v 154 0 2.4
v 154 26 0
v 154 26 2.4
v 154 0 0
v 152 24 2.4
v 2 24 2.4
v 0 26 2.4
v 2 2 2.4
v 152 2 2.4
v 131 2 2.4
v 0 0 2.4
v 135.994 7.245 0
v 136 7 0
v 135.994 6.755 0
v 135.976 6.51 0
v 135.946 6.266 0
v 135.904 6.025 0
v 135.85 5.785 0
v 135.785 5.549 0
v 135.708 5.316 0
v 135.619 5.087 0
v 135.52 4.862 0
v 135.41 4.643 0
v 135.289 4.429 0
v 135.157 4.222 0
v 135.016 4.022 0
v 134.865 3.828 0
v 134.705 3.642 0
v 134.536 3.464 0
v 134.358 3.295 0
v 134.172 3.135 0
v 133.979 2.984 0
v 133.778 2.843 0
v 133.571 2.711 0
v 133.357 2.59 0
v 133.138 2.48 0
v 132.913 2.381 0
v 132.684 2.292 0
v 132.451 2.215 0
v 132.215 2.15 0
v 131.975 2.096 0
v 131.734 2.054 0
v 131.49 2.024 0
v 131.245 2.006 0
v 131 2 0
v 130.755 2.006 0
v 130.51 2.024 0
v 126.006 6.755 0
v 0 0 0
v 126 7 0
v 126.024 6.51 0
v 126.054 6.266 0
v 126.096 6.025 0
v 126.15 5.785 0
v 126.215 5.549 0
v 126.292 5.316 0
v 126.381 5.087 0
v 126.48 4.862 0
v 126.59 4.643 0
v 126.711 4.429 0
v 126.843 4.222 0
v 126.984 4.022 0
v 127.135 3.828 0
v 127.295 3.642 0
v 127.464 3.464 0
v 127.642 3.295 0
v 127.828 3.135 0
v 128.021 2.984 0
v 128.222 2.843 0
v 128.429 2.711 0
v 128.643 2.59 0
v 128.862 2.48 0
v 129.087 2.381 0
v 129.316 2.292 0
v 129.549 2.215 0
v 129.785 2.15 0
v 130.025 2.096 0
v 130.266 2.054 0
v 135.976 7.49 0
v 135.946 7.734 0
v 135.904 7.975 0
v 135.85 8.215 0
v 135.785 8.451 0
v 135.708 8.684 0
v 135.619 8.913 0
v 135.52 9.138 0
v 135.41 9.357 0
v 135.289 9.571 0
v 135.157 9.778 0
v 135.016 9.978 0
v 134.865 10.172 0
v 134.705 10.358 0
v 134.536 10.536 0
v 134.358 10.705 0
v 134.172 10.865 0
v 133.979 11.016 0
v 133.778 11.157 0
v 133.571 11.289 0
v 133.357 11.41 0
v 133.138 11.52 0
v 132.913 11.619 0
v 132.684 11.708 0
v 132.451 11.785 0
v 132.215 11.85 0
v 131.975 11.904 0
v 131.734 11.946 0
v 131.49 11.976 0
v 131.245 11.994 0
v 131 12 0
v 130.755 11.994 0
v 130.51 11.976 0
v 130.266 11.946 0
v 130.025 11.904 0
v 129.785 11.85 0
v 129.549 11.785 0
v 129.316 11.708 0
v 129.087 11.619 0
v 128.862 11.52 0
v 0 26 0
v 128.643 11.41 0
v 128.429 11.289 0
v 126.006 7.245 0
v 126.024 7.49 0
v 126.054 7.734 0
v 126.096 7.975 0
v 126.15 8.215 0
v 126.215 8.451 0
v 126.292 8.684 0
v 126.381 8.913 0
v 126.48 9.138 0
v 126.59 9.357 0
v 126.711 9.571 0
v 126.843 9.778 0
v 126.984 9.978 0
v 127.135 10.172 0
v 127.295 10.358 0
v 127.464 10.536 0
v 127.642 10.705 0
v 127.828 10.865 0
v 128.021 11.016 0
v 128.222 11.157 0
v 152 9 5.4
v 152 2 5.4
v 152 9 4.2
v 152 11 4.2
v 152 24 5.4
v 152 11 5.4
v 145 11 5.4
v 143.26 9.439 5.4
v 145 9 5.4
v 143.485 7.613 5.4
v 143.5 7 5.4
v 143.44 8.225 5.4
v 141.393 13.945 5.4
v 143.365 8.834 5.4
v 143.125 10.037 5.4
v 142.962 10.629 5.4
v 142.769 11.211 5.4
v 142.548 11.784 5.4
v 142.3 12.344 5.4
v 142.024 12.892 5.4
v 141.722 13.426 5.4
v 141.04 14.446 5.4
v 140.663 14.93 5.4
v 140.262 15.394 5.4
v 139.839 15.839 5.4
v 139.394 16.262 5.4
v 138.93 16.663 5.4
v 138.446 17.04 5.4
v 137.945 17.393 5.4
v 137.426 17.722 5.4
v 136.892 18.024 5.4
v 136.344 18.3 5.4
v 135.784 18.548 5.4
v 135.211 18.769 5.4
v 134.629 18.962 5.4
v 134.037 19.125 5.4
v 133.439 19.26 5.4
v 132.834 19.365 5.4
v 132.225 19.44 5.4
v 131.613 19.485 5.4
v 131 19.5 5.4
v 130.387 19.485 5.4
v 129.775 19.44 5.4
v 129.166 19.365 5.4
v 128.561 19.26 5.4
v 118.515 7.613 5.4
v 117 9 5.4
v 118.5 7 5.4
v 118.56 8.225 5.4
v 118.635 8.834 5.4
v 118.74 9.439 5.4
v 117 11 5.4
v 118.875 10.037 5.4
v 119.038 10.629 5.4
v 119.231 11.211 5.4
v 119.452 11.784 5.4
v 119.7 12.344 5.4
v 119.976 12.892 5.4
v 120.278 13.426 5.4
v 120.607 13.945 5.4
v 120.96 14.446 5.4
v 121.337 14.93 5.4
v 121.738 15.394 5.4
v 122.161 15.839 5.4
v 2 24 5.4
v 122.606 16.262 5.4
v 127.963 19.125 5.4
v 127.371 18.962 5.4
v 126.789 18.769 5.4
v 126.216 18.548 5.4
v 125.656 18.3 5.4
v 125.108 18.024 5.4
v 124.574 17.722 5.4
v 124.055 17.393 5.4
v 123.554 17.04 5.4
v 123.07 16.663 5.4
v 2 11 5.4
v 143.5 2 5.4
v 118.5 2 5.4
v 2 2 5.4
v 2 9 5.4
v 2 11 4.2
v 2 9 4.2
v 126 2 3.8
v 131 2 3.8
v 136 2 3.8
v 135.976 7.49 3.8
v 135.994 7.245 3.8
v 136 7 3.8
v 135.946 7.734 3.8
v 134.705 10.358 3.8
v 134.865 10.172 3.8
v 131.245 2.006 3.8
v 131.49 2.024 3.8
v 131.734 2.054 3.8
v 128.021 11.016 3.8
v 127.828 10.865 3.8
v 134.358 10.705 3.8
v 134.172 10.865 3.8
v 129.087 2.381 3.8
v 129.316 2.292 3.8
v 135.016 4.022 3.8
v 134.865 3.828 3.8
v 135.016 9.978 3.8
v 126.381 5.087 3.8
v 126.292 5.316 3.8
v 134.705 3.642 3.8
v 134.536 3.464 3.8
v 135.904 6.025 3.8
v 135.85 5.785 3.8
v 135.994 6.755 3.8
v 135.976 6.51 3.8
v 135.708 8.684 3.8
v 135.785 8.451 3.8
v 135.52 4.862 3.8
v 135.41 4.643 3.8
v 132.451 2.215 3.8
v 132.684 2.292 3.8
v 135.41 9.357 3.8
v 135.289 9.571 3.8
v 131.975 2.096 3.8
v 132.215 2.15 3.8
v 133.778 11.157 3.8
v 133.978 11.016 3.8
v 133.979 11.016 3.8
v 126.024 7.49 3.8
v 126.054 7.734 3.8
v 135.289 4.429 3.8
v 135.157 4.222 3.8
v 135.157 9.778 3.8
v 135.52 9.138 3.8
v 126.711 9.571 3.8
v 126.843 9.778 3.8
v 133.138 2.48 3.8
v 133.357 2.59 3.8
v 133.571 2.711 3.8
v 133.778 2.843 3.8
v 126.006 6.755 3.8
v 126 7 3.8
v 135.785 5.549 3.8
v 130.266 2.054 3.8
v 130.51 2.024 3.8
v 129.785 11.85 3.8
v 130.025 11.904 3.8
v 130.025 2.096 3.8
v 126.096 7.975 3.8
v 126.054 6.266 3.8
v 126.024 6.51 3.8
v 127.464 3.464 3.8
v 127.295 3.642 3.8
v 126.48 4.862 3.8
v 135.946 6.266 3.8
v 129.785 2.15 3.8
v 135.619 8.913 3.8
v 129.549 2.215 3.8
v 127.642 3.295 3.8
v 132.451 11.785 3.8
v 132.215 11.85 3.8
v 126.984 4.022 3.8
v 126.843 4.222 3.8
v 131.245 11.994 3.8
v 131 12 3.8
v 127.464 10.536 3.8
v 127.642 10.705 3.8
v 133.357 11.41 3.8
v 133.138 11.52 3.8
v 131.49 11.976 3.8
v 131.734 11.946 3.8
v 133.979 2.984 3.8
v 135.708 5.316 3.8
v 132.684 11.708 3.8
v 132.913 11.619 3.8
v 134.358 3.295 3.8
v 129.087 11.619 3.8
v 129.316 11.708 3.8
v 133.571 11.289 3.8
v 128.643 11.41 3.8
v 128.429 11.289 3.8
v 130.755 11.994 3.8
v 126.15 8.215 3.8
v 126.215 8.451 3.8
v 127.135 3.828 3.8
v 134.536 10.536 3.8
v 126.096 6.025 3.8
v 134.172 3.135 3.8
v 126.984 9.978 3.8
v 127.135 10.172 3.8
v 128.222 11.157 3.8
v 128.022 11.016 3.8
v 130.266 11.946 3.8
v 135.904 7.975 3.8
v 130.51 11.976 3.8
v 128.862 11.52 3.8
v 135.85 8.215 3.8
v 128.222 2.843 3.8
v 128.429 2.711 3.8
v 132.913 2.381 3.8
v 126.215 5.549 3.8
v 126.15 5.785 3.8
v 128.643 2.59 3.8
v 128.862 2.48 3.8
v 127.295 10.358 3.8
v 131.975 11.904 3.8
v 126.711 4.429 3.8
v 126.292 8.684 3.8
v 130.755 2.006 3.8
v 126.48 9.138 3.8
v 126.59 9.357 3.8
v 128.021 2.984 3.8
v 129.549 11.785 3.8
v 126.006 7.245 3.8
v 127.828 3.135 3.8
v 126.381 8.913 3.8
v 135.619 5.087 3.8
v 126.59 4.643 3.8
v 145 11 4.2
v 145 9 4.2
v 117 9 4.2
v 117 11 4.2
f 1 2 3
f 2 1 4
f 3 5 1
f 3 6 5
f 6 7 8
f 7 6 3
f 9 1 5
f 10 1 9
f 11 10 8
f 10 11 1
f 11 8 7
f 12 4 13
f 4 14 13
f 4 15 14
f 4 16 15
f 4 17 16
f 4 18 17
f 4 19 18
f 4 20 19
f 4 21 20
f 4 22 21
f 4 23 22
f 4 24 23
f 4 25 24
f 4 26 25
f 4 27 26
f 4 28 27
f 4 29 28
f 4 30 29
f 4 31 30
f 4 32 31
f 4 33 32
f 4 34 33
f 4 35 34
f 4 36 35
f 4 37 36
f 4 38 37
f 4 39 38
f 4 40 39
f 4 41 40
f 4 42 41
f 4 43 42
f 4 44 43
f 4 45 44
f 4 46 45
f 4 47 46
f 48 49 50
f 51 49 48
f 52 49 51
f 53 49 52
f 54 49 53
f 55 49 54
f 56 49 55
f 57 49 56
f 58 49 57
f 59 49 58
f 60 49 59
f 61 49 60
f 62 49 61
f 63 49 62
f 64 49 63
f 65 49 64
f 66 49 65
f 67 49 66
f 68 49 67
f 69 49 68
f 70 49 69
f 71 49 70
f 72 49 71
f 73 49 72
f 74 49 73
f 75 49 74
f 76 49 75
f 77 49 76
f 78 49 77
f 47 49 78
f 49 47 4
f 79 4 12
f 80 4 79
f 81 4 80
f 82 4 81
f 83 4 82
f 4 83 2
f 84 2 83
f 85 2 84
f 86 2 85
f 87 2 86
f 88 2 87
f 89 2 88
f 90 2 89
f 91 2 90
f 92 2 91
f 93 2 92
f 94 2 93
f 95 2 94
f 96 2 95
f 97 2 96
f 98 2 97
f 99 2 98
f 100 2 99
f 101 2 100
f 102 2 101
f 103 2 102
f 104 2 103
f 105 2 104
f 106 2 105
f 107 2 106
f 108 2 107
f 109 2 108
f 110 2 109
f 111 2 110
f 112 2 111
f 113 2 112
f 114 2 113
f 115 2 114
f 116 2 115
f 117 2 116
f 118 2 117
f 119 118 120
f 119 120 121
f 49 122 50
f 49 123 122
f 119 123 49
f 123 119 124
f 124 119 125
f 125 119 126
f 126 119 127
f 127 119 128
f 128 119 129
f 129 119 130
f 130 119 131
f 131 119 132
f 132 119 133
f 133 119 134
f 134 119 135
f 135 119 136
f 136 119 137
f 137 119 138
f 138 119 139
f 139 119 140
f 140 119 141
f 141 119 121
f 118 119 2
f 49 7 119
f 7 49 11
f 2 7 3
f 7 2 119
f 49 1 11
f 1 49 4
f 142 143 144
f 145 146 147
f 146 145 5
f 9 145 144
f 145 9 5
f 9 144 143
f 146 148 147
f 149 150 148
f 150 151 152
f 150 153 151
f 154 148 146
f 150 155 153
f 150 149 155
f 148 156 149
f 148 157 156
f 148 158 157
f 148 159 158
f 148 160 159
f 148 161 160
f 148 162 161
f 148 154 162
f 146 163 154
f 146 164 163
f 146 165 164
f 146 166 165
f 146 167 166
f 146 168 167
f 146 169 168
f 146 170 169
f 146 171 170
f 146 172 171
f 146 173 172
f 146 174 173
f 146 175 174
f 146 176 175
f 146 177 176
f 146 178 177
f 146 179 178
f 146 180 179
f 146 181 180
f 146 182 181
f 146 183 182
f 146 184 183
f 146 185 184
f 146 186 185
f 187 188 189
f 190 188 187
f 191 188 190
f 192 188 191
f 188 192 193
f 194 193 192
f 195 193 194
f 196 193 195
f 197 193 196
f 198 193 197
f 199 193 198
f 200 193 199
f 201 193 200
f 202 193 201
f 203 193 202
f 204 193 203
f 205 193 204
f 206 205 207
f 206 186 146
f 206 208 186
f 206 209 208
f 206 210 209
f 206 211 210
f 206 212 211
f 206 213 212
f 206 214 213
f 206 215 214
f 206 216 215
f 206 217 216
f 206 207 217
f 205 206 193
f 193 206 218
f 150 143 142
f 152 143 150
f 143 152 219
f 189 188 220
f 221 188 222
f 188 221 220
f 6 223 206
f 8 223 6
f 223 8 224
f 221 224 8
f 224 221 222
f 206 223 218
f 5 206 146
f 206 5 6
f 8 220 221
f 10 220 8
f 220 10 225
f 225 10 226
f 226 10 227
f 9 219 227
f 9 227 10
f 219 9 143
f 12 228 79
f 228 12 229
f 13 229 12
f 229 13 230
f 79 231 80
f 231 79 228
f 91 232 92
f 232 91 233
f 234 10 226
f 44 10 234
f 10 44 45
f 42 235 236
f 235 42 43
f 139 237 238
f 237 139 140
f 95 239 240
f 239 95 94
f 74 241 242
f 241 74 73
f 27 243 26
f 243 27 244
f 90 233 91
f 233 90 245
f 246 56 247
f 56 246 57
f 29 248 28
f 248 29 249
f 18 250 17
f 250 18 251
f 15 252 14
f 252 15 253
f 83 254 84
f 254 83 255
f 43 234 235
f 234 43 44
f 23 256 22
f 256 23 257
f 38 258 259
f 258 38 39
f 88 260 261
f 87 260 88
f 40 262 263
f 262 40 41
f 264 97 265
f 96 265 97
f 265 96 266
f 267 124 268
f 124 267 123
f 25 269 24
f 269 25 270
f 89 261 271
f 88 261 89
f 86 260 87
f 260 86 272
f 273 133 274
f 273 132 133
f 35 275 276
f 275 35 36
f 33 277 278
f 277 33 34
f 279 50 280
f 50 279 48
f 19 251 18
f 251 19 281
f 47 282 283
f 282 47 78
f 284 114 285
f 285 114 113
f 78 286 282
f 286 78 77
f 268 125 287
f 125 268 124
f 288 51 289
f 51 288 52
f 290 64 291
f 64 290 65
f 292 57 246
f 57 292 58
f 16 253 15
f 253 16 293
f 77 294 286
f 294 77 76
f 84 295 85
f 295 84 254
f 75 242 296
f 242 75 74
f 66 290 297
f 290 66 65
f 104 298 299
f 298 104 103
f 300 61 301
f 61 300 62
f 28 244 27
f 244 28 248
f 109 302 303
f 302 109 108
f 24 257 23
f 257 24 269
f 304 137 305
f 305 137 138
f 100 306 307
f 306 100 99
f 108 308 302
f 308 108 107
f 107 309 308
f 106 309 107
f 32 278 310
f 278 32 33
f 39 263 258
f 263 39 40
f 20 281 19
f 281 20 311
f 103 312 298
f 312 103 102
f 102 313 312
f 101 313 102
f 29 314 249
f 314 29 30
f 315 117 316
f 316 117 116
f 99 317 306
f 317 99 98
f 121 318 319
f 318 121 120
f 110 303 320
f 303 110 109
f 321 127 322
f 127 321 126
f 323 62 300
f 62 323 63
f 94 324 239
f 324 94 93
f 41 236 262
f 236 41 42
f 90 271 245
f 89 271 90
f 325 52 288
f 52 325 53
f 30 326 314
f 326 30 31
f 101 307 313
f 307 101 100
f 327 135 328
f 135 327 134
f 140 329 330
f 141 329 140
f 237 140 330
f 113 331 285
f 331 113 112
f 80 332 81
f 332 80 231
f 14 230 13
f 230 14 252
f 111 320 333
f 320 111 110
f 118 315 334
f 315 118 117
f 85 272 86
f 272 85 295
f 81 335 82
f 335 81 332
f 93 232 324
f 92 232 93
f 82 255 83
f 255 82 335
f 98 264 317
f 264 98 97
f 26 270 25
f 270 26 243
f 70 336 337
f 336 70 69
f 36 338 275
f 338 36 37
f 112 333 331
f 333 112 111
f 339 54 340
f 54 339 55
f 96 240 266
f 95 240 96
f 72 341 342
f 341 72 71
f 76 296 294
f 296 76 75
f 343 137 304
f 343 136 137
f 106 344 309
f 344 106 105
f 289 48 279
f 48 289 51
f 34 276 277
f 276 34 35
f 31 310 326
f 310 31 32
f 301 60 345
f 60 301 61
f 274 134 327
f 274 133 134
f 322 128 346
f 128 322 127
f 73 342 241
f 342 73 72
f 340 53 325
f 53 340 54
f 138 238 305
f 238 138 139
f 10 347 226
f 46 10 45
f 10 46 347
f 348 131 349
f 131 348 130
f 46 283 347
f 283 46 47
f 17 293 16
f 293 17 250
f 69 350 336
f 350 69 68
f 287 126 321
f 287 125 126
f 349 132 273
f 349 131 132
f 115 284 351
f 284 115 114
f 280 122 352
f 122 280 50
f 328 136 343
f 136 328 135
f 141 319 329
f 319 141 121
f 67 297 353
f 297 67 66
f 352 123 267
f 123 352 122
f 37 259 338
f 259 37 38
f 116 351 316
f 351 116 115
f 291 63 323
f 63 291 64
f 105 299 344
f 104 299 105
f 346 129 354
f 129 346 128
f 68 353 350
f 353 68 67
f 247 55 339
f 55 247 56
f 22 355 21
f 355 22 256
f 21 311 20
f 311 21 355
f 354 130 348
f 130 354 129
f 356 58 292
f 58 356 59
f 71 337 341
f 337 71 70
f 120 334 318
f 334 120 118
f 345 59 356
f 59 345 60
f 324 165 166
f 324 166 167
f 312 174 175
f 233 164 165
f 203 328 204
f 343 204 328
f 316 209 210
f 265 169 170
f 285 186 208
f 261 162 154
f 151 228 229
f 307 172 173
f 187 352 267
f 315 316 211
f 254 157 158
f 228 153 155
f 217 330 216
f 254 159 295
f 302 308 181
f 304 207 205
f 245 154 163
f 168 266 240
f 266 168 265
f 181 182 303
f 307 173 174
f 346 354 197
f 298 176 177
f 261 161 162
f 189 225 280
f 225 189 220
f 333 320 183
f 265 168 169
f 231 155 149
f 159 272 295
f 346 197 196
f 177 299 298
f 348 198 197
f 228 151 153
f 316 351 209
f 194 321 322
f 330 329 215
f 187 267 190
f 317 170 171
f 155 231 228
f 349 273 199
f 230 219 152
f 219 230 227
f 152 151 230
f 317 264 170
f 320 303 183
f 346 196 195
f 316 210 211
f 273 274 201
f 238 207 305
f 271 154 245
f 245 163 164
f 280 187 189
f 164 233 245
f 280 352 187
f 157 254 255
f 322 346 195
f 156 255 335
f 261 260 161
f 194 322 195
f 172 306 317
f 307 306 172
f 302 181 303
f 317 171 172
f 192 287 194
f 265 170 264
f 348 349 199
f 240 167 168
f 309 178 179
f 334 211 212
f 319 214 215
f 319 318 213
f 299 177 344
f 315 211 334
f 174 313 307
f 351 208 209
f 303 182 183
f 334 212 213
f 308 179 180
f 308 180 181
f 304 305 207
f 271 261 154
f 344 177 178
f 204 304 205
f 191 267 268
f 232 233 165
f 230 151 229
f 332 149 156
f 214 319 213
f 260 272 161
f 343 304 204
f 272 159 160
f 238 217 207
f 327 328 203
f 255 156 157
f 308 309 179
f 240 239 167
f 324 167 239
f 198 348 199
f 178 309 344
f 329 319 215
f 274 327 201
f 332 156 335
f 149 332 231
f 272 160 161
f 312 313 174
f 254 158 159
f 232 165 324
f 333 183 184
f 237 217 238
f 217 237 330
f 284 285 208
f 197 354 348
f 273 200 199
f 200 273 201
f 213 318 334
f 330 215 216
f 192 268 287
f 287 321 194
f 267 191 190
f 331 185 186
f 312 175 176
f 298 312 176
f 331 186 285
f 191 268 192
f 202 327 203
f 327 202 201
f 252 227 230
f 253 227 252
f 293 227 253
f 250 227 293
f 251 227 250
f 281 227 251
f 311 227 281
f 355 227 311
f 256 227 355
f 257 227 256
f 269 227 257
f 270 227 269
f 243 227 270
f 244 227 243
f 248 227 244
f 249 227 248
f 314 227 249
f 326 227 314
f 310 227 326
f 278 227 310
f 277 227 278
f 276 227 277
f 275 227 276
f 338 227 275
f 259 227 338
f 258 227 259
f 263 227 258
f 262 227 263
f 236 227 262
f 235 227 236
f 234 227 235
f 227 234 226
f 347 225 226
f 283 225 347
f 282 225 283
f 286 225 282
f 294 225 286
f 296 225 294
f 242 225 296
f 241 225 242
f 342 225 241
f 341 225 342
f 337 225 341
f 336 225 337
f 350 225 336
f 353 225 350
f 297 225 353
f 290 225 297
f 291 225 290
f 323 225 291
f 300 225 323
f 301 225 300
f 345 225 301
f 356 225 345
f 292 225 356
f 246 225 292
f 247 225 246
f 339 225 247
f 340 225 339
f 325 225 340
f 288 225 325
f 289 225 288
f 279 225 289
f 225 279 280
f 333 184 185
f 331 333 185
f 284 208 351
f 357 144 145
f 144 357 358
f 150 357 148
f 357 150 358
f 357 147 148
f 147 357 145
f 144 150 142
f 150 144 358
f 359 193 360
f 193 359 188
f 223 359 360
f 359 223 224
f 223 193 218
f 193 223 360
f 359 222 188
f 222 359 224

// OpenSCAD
// ПК8010 Корвет small right-side lid. All dimensions are in millimetres.
// Print with the broad base on the bed.

base_length = 154;
base_width = 26;
base_thickness = 2.4;
upper_length = 150;
upper_width = 22;
upper_height = 3;
button_hole_diameter = 10;
button_hole_from_right = 23;
button_hole_from_bottom = 7;
groove_from_bottom = 10;
groove_width = 2;
groove_depth = 1.2;
right_groove_length = 7;
left_groove_length = 115;
finger_recess_width = 25;
finger_recess_height = 25;
finger_recess_depth = 1.6;

upper_left = (base_length - upper_length) / 2;
upper_right = (base_length + upper_length) / 2;
epsilon = 0.01;
$fn = 128;

assert(base_length >= upper_length && base_width >= upper_width);
assert(upper_length > 0 && upper_width > 0);
assert(base_thickness > 0 && upper_height > 0);
assert(groove_depth > 0 && groove_depth < upper_height);
assert(finger_recess_width > button_hole_diameter
       && finger_recess_height > button_hole_diameter);
assert(finger_recess_depth > 0 && finger_recess_depth < upper_height);

// Rounded upper outline with straight sides continuing to the bottom edge.
module recess_profile(width, height) {
    union() {
        scale([width / 2, height / 2]) circle(r = 1);
        translate([-width / 2, -button_hole_from_bottom - epsilon])
            square([width, button_hole_from_bottom + epsilon]);
    }
}

difference() {
    union() {
        cube([base_length, base_width, base_thickness]);
        translate([
            (base_length - upper_length) / 2,
            (base_width - upper_width) / 2,
            base_thickness
        ])
            cube([upper_length, upper_width, upper_height]);
    }
    // Offsets are measured from the outer base edges in top view.
    translate([base_length - button_hole_from_right,
               button_hole_from_bottom, -epsilon])
        cylinder(d = button_hole_diameter,
                 h = base_thickness + upper_height + 2 * epsilon);

    // Open-bottom finger recess, sloping to the specified central depth.
    translate([base_length - button_hole_from_right,
               button_hole_from_bottom,
               base_thickness + upper_height - finger_recess_depth]) {
        hull() {
            linear_extrude(height = epsilon)
                recess_profile(button_hole_diameter, button_hole_diameter);
            translate([0, 0, finger_recess_depth])
                linear_extrude(height = epsilon)
                    recess_profile(finger_recess_width, finger_recess_height);
        }
    }

    // Short groove opens at the raised section's right edge.
    translate([upper_right - right_groove_length,
               groove_from_bottom - groove_width / 2,
               base_thickness + upper_height - groove_depth])
        cube([right_groove_length + epsilon, groove_width,
              groove_depth + epsilon]);

    // Long groove opens at the raised section's left edge.
    translate([upper_left - epsilon,
               groove_from_bottom - groove_width / 2,
               base_thickness + upper_height - groove_depth])
        cube([left_groove_length + epsilon,
              groove_width, groove_depth + epsilon]);
}
